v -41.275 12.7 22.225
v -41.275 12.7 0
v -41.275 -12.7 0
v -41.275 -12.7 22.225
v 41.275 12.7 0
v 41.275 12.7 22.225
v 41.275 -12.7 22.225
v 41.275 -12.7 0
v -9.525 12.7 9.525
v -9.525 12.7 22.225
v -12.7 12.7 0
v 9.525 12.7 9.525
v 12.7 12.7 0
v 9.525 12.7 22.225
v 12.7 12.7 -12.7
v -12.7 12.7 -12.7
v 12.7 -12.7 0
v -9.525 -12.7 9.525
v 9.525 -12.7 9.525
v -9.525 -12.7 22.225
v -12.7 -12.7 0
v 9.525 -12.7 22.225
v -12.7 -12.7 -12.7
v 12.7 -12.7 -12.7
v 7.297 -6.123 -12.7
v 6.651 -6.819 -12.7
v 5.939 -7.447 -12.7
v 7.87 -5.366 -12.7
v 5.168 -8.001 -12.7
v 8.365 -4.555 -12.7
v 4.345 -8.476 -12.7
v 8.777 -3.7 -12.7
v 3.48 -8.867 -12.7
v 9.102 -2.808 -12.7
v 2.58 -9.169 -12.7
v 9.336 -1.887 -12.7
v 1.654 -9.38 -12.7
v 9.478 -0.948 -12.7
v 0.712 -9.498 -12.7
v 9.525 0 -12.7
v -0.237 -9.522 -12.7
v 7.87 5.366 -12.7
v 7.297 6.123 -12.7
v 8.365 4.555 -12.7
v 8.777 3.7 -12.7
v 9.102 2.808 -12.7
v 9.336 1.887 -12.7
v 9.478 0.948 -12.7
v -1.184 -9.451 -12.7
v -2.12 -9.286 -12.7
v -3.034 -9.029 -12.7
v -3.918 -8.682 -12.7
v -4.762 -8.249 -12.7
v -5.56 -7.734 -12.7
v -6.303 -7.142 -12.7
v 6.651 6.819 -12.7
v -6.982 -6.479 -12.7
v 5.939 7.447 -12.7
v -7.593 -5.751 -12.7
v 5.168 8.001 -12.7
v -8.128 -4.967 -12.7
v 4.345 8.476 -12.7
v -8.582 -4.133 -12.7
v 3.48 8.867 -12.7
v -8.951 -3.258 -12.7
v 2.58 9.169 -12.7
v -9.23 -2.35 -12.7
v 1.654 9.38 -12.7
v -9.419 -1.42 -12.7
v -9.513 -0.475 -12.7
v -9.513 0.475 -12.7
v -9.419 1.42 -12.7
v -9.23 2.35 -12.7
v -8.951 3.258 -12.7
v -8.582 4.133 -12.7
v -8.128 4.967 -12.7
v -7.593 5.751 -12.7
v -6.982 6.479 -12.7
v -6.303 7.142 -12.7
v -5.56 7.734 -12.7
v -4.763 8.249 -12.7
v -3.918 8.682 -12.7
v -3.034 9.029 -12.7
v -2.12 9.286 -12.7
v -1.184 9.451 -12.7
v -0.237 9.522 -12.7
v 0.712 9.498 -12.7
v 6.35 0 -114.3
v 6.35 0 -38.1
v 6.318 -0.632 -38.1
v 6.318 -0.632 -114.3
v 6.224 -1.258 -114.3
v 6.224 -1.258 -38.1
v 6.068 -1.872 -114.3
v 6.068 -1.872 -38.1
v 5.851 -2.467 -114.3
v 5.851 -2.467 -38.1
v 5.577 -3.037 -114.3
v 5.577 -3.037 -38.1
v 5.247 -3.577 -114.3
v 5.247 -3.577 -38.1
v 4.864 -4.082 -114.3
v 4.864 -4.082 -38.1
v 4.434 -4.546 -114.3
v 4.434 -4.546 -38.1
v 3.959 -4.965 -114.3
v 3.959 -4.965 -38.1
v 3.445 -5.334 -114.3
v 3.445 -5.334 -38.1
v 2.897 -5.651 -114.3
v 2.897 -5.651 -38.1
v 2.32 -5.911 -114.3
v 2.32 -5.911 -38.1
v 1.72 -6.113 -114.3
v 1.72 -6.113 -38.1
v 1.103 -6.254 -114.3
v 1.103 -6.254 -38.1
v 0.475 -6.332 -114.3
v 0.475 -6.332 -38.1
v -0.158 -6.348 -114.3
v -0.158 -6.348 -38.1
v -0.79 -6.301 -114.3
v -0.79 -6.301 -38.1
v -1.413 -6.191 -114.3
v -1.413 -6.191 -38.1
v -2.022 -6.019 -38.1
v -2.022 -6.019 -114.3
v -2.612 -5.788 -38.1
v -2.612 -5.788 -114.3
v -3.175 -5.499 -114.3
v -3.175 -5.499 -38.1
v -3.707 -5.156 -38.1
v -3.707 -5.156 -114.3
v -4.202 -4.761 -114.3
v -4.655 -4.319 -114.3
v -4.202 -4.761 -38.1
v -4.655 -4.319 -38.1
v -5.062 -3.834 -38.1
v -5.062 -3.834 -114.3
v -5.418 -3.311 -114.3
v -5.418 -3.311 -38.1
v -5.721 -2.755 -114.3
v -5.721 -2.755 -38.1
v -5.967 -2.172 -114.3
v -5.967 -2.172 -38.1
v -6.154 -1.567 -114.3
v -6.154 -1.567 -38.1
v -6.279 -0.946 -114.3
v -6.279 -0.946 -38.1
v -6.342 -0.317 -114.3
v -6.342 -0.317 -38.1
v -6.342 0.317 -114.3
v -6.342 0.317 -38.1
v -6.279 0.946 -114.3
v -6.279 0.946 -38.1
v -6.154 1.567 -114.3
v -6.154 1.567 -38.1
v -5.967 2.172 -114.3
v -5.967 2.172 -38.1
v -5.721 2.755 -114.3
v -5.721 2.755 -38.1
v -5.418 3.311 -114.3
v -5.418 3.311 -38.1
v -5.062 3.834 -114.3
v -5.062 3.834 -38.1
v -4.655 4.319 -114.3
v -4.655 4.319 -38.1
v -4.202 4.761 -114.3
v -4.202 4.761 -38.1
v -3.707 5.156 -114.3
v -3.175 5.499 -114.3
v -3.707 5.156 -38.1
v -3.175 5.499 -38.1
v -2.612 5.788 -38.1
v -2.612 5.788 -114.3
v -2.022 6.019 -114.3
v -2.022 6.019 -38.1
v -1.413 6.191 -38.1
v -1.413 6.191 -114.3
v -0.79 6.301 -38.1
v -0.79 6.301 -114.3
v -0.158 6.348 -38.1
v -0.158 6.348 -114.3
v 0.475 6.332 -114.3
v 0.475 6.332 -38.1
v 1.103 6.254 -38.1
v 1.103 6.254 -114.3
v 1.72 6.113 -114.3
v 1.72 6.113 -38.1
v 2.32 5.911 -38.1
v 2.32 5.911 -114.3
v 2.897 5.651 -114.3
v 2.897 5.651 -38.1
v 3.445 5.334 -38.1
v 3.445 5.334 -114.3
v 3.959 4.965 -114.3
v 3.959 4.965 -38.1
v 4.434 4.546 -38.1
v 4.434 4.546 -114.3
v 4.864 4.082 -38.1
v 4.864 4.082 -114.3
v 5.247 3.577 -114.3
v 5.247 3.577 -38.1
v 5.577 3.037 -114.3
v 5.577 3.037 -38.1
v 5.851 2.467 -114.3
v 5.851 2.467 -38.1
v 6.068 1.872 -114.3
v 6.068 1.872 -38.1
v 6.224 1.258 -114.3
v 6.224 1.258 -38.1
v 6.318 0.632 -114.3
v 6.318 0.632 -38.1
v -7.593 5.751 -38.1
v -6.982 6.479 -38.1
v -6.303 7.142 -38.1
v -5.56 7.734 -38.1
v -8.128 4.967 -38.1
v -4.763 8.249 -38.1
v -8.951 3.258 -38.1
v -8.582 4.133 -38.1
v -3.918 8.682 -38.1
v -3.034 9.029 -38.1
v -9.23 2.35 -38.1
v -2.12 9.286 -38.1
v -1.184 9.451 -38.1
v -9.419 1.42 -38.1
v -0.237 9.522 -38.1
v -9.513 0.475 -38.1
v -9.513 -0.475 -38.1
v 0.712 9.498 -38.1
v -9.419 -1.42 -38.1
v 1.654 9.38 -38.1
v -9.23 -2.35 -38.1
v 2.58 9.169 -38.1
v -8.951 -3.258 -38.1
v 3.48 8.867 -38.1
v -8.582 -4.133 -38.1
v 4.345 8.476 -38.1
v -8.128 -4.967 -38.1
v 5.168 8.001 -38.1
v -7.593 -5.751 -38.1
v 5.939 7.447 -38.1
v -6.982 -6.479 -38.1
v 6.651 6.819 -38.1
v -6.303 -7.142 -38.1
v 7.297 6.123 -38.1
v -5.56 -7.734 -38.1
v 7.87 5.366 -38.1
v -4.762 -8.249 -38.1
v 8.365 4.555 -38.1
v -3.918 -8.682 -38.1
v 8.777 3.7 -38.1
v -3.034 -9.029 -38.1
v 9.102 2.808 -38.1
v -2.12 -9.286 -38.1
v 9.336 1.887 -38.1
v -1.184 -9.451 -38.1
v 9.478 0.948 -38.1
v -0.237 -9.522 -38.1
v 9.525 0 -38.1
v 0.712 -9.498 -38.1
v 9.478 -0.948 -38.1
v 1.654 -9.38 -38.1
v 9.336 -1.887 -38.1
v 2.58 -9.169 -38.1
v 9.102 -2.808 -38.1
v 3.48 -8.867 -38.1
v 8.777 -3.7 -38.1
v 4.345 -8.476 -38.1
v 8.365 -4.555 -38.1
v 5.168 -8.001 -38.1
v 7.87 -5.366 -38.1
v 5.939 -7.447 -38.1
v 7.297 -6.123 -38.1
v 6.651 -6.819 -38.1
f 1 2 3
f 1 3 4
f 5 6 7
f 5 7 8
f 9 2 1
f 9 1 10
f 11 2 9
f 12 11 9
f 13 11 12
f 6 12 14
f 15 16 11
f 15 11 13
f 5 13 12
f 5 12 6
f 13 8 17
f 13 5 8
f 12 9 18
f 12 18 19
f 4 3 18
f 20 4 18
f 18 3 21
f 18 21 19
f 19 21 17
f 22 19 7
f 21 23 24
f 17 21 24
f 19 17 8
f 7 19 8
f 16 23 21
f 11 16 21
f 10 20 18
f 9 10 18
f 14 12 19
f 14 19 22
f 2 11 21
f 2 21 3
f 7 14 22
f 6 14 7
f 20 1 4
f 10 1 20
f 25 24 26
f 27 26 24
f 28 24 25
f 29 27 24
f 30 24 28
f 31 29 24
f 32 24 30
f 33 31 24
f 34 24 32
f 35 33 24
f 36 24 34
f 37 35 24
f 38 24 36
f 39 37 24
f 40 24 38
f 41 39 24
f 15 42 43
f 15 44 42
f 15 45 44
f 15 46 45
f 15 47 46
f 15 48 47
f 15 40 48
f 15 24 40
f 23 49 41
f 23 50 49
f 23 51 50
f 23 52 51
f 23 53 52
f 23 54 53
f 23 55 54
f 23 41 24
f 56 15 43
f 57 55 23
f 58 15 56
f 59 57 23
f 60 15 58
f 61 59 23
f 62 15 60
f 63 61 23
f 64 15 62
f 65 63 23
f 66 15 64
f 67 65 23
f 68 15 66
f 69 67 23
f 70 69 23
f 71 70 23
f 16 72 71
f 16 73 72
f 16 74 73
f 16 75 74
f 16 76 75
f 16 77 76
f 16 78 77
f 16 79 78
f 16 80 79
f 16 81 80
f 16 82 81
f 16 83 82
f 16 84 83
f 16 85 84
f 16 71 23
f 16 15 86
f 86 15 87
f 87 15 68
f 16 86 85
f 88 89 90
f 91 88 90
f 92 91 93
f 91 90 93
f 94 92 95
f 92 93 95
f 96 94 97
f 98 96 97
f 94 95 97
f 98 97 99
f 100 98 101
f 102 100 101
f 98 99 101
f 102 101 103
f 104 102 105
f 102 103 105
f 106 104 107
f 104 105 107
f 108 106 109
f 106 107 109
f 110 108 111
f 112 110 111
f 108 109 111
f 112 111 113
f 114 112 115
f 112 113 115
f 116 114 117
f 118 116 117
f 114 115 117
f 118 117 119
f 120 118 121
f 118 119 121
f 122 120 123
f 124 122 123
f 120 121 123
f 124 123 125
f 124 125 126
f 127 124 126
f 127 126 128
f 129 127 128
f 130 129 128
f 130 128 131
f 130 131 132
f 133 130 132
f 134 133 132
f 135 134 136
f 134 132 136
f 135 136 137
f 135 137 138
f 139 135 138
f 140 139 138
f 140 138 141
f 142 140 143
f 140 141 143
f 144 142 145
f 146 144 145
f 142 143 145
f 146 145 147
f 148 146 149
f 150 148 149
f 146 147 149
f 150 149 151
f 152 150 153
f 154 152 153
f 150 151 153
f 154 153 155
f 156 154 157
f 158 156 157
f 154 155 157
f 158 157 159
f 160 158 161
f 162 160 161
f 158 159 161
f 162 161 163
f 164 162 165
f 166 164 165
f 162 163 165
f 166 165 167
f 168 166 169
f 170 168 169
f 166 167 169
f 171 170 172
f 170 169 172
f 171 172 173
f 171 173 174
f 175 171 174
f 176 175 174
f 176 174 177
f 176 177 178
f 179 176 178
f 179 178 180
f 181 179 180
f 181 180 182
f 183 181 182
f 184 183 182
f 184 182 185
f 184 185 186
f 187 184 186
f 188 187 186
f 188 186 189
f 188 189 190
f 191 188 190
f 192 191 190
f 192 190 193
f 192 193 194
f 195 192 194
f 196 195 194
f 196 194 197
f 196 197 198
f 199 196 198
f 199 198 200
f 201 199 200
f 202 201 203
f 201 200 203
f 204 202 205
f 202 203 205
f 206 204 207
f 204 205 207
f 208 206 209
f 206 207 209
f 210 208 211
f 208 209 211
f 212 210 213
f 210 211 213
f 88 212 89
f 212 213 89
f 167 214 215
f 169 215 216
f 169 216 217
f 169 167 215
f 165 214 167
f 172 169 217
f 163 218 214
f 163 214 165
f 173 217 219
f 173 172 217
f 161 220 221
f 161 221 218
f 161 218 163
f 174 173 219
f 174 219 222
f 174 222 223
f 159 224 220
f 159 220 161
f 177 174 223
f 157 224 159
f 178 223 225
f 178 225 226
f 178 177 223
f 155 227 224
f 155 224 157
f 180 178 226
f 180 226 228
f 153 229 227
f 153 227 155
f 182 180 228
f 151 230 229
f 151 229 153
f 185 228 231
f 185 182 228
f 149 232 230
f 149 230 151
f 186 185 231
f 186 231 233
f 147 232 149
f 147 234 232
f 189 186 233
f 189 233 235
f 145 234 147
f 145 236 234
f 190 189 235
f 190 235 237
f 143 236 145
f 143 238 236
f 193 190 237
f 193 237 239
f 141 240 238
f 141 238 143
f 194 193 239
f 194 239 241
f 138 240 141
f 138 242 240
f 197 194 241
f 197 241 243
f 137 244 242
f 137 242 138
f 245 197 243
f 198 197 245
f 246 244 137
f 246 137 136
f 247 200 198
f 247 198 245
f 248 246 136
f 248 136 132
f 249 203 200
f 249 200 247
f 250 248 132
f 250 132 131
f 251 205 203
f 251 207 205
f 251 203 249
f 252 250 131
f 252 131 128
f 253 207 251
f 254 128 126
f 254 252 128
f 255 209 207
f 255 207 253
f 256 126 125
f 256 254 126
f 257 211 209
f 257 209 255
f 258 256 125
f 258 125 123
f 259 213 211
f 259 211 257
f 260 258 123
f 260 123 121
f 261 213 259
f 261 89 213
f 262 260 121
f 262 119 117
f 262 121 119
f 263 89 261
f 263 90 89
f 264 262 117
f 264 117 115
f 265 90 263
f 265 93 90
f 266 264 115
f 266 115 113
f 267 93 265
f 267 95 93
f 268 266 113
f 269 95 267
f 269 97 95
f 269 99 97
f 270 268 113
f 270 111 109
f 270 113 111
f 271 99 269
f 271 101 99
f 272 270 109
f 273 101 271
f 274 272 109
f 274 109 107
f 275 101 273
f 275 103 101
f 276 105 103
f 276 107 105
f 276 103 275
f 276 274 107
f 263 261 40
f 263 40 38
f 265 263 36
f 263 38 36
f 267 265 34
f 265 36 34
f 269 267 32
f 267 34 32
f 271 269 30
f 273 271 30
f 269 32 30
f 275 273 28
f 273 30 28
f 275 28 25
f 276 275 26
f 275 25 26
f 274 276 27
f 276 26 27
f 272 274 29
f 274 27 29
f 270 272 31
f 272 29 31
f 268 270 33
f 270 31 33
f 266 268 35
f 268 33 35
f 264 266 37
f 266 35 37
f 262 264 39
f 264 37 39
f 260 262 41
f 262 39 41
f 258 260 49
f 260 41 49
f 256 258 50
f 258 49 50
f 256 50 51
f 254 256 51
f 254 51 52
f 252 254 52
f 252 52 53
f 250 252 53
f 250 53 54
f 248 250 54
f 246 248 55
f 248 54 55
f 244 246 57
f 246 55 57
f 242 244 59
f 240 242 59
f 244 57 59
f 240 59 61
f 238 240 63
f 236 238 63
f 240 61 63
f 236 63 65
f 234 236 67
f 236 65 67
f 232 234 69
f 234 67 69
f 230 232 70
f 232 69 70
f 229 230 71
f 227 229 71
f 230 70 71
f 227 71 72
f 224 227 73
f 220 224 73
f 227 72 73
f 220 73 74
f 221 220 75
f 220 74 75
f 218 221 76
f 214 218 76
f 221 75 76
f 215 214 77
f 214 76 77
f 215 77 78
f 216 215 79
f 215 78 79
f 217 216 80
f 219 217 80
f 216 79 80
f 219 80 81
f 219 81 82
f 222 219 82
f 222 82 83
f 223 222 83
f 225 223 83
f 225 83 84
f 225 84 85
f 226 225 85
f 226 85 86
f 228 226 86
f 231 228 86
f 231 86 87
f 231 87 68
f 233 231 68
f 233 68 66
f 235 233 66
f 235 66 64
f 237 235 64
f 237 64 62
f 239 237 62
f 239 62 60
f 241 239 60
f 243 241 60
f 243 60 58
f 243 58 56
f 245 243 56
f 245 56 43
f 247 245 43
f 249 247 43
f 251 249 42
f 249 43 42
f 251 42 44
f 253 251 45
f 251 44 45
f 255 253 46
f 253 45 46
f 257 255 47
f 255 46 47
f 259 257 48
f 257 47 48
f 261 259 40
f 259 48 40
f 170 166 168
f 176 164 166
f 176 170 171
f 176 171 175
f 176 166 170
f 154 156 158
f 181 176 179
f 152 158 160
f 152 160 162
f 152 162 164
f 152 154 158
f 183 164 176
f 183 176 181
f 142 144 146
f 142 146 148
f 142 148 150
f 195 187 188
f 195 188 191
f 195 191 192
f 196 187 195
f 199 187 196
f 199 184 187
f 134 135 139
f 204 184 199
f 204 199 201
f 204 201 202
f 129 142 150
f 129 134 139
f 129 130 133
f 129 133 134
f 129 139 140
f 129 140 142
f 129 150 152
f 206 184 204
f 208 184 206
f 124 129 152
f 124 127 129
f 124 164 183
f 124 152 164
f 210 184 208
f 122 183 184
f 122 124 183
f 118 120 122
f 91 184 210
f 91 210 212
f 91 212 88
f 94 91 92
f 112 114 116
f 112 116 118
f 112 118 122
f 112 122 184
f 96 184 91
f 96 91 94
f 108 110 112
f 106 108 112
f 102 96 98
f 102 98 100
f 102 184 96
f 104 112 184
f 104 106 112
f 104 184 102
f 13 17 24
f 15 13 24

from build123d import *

# Parameters (mm, degrees)
BOSS_EXTRUDE1_DEPTH = 12.7
SKETCH2_R           = 9.525
BOSS_EXTRUDE2_DEPTH = 25.4
SKETCH3_R           = 6.35
BOSS_EXTRUDE3_DEPTH = 76.2


with BuildPart() as part:
    # Sketch1 → Boss-Extrude1 (new, symmetric)
    with BuildSketch(Plane(origin=(0, 0, 0), x_dir=(1, 0, 0), z_dir=(0, 1, 0))):
        Polygon((12.7, 12.7), (-12.7, 12.7), (-12.7, 0), (-41.275, 0), (-41.275, -22.225), (-9.525, -22.225), (-9.525, -9.525), (9.525, -9.525), (9.525, -22.225), (41.275, -22.225), (41.275, 0), (12.7, 0), align=None)
    extrude(amount=BOSS_EXTRUDE1_DEPTH, both=True)

    # Sketch2 → Boss-Extrude2 (add)
    with BuildSketch(Plane(origin=(0, 0, -12.7), x_dir=(-1, 0, 0), z_dir=(0, 0, -1))):
        with Locations(Location((0, 0, 0), (0, 0, 180))):
            Circle(SKETCH2_R)
    extrude(amount=BOSS_EXTRUDE2_DEPTH)

    # Sketch3 → Boss-Extrude3 (add)
    with BuildSketch(Plane(origin=(0, 0, -38.1), x_dir=(-1, 0, 0), z_dir=(0, 0, -1))):
        with Locations(Location((0, 0, 0), (0, 0, 180))):
            Circle(SKETCH3_R)
    extrude(amount=BOSS_EXTRUDE3_DEPTH)


solid = part.part
